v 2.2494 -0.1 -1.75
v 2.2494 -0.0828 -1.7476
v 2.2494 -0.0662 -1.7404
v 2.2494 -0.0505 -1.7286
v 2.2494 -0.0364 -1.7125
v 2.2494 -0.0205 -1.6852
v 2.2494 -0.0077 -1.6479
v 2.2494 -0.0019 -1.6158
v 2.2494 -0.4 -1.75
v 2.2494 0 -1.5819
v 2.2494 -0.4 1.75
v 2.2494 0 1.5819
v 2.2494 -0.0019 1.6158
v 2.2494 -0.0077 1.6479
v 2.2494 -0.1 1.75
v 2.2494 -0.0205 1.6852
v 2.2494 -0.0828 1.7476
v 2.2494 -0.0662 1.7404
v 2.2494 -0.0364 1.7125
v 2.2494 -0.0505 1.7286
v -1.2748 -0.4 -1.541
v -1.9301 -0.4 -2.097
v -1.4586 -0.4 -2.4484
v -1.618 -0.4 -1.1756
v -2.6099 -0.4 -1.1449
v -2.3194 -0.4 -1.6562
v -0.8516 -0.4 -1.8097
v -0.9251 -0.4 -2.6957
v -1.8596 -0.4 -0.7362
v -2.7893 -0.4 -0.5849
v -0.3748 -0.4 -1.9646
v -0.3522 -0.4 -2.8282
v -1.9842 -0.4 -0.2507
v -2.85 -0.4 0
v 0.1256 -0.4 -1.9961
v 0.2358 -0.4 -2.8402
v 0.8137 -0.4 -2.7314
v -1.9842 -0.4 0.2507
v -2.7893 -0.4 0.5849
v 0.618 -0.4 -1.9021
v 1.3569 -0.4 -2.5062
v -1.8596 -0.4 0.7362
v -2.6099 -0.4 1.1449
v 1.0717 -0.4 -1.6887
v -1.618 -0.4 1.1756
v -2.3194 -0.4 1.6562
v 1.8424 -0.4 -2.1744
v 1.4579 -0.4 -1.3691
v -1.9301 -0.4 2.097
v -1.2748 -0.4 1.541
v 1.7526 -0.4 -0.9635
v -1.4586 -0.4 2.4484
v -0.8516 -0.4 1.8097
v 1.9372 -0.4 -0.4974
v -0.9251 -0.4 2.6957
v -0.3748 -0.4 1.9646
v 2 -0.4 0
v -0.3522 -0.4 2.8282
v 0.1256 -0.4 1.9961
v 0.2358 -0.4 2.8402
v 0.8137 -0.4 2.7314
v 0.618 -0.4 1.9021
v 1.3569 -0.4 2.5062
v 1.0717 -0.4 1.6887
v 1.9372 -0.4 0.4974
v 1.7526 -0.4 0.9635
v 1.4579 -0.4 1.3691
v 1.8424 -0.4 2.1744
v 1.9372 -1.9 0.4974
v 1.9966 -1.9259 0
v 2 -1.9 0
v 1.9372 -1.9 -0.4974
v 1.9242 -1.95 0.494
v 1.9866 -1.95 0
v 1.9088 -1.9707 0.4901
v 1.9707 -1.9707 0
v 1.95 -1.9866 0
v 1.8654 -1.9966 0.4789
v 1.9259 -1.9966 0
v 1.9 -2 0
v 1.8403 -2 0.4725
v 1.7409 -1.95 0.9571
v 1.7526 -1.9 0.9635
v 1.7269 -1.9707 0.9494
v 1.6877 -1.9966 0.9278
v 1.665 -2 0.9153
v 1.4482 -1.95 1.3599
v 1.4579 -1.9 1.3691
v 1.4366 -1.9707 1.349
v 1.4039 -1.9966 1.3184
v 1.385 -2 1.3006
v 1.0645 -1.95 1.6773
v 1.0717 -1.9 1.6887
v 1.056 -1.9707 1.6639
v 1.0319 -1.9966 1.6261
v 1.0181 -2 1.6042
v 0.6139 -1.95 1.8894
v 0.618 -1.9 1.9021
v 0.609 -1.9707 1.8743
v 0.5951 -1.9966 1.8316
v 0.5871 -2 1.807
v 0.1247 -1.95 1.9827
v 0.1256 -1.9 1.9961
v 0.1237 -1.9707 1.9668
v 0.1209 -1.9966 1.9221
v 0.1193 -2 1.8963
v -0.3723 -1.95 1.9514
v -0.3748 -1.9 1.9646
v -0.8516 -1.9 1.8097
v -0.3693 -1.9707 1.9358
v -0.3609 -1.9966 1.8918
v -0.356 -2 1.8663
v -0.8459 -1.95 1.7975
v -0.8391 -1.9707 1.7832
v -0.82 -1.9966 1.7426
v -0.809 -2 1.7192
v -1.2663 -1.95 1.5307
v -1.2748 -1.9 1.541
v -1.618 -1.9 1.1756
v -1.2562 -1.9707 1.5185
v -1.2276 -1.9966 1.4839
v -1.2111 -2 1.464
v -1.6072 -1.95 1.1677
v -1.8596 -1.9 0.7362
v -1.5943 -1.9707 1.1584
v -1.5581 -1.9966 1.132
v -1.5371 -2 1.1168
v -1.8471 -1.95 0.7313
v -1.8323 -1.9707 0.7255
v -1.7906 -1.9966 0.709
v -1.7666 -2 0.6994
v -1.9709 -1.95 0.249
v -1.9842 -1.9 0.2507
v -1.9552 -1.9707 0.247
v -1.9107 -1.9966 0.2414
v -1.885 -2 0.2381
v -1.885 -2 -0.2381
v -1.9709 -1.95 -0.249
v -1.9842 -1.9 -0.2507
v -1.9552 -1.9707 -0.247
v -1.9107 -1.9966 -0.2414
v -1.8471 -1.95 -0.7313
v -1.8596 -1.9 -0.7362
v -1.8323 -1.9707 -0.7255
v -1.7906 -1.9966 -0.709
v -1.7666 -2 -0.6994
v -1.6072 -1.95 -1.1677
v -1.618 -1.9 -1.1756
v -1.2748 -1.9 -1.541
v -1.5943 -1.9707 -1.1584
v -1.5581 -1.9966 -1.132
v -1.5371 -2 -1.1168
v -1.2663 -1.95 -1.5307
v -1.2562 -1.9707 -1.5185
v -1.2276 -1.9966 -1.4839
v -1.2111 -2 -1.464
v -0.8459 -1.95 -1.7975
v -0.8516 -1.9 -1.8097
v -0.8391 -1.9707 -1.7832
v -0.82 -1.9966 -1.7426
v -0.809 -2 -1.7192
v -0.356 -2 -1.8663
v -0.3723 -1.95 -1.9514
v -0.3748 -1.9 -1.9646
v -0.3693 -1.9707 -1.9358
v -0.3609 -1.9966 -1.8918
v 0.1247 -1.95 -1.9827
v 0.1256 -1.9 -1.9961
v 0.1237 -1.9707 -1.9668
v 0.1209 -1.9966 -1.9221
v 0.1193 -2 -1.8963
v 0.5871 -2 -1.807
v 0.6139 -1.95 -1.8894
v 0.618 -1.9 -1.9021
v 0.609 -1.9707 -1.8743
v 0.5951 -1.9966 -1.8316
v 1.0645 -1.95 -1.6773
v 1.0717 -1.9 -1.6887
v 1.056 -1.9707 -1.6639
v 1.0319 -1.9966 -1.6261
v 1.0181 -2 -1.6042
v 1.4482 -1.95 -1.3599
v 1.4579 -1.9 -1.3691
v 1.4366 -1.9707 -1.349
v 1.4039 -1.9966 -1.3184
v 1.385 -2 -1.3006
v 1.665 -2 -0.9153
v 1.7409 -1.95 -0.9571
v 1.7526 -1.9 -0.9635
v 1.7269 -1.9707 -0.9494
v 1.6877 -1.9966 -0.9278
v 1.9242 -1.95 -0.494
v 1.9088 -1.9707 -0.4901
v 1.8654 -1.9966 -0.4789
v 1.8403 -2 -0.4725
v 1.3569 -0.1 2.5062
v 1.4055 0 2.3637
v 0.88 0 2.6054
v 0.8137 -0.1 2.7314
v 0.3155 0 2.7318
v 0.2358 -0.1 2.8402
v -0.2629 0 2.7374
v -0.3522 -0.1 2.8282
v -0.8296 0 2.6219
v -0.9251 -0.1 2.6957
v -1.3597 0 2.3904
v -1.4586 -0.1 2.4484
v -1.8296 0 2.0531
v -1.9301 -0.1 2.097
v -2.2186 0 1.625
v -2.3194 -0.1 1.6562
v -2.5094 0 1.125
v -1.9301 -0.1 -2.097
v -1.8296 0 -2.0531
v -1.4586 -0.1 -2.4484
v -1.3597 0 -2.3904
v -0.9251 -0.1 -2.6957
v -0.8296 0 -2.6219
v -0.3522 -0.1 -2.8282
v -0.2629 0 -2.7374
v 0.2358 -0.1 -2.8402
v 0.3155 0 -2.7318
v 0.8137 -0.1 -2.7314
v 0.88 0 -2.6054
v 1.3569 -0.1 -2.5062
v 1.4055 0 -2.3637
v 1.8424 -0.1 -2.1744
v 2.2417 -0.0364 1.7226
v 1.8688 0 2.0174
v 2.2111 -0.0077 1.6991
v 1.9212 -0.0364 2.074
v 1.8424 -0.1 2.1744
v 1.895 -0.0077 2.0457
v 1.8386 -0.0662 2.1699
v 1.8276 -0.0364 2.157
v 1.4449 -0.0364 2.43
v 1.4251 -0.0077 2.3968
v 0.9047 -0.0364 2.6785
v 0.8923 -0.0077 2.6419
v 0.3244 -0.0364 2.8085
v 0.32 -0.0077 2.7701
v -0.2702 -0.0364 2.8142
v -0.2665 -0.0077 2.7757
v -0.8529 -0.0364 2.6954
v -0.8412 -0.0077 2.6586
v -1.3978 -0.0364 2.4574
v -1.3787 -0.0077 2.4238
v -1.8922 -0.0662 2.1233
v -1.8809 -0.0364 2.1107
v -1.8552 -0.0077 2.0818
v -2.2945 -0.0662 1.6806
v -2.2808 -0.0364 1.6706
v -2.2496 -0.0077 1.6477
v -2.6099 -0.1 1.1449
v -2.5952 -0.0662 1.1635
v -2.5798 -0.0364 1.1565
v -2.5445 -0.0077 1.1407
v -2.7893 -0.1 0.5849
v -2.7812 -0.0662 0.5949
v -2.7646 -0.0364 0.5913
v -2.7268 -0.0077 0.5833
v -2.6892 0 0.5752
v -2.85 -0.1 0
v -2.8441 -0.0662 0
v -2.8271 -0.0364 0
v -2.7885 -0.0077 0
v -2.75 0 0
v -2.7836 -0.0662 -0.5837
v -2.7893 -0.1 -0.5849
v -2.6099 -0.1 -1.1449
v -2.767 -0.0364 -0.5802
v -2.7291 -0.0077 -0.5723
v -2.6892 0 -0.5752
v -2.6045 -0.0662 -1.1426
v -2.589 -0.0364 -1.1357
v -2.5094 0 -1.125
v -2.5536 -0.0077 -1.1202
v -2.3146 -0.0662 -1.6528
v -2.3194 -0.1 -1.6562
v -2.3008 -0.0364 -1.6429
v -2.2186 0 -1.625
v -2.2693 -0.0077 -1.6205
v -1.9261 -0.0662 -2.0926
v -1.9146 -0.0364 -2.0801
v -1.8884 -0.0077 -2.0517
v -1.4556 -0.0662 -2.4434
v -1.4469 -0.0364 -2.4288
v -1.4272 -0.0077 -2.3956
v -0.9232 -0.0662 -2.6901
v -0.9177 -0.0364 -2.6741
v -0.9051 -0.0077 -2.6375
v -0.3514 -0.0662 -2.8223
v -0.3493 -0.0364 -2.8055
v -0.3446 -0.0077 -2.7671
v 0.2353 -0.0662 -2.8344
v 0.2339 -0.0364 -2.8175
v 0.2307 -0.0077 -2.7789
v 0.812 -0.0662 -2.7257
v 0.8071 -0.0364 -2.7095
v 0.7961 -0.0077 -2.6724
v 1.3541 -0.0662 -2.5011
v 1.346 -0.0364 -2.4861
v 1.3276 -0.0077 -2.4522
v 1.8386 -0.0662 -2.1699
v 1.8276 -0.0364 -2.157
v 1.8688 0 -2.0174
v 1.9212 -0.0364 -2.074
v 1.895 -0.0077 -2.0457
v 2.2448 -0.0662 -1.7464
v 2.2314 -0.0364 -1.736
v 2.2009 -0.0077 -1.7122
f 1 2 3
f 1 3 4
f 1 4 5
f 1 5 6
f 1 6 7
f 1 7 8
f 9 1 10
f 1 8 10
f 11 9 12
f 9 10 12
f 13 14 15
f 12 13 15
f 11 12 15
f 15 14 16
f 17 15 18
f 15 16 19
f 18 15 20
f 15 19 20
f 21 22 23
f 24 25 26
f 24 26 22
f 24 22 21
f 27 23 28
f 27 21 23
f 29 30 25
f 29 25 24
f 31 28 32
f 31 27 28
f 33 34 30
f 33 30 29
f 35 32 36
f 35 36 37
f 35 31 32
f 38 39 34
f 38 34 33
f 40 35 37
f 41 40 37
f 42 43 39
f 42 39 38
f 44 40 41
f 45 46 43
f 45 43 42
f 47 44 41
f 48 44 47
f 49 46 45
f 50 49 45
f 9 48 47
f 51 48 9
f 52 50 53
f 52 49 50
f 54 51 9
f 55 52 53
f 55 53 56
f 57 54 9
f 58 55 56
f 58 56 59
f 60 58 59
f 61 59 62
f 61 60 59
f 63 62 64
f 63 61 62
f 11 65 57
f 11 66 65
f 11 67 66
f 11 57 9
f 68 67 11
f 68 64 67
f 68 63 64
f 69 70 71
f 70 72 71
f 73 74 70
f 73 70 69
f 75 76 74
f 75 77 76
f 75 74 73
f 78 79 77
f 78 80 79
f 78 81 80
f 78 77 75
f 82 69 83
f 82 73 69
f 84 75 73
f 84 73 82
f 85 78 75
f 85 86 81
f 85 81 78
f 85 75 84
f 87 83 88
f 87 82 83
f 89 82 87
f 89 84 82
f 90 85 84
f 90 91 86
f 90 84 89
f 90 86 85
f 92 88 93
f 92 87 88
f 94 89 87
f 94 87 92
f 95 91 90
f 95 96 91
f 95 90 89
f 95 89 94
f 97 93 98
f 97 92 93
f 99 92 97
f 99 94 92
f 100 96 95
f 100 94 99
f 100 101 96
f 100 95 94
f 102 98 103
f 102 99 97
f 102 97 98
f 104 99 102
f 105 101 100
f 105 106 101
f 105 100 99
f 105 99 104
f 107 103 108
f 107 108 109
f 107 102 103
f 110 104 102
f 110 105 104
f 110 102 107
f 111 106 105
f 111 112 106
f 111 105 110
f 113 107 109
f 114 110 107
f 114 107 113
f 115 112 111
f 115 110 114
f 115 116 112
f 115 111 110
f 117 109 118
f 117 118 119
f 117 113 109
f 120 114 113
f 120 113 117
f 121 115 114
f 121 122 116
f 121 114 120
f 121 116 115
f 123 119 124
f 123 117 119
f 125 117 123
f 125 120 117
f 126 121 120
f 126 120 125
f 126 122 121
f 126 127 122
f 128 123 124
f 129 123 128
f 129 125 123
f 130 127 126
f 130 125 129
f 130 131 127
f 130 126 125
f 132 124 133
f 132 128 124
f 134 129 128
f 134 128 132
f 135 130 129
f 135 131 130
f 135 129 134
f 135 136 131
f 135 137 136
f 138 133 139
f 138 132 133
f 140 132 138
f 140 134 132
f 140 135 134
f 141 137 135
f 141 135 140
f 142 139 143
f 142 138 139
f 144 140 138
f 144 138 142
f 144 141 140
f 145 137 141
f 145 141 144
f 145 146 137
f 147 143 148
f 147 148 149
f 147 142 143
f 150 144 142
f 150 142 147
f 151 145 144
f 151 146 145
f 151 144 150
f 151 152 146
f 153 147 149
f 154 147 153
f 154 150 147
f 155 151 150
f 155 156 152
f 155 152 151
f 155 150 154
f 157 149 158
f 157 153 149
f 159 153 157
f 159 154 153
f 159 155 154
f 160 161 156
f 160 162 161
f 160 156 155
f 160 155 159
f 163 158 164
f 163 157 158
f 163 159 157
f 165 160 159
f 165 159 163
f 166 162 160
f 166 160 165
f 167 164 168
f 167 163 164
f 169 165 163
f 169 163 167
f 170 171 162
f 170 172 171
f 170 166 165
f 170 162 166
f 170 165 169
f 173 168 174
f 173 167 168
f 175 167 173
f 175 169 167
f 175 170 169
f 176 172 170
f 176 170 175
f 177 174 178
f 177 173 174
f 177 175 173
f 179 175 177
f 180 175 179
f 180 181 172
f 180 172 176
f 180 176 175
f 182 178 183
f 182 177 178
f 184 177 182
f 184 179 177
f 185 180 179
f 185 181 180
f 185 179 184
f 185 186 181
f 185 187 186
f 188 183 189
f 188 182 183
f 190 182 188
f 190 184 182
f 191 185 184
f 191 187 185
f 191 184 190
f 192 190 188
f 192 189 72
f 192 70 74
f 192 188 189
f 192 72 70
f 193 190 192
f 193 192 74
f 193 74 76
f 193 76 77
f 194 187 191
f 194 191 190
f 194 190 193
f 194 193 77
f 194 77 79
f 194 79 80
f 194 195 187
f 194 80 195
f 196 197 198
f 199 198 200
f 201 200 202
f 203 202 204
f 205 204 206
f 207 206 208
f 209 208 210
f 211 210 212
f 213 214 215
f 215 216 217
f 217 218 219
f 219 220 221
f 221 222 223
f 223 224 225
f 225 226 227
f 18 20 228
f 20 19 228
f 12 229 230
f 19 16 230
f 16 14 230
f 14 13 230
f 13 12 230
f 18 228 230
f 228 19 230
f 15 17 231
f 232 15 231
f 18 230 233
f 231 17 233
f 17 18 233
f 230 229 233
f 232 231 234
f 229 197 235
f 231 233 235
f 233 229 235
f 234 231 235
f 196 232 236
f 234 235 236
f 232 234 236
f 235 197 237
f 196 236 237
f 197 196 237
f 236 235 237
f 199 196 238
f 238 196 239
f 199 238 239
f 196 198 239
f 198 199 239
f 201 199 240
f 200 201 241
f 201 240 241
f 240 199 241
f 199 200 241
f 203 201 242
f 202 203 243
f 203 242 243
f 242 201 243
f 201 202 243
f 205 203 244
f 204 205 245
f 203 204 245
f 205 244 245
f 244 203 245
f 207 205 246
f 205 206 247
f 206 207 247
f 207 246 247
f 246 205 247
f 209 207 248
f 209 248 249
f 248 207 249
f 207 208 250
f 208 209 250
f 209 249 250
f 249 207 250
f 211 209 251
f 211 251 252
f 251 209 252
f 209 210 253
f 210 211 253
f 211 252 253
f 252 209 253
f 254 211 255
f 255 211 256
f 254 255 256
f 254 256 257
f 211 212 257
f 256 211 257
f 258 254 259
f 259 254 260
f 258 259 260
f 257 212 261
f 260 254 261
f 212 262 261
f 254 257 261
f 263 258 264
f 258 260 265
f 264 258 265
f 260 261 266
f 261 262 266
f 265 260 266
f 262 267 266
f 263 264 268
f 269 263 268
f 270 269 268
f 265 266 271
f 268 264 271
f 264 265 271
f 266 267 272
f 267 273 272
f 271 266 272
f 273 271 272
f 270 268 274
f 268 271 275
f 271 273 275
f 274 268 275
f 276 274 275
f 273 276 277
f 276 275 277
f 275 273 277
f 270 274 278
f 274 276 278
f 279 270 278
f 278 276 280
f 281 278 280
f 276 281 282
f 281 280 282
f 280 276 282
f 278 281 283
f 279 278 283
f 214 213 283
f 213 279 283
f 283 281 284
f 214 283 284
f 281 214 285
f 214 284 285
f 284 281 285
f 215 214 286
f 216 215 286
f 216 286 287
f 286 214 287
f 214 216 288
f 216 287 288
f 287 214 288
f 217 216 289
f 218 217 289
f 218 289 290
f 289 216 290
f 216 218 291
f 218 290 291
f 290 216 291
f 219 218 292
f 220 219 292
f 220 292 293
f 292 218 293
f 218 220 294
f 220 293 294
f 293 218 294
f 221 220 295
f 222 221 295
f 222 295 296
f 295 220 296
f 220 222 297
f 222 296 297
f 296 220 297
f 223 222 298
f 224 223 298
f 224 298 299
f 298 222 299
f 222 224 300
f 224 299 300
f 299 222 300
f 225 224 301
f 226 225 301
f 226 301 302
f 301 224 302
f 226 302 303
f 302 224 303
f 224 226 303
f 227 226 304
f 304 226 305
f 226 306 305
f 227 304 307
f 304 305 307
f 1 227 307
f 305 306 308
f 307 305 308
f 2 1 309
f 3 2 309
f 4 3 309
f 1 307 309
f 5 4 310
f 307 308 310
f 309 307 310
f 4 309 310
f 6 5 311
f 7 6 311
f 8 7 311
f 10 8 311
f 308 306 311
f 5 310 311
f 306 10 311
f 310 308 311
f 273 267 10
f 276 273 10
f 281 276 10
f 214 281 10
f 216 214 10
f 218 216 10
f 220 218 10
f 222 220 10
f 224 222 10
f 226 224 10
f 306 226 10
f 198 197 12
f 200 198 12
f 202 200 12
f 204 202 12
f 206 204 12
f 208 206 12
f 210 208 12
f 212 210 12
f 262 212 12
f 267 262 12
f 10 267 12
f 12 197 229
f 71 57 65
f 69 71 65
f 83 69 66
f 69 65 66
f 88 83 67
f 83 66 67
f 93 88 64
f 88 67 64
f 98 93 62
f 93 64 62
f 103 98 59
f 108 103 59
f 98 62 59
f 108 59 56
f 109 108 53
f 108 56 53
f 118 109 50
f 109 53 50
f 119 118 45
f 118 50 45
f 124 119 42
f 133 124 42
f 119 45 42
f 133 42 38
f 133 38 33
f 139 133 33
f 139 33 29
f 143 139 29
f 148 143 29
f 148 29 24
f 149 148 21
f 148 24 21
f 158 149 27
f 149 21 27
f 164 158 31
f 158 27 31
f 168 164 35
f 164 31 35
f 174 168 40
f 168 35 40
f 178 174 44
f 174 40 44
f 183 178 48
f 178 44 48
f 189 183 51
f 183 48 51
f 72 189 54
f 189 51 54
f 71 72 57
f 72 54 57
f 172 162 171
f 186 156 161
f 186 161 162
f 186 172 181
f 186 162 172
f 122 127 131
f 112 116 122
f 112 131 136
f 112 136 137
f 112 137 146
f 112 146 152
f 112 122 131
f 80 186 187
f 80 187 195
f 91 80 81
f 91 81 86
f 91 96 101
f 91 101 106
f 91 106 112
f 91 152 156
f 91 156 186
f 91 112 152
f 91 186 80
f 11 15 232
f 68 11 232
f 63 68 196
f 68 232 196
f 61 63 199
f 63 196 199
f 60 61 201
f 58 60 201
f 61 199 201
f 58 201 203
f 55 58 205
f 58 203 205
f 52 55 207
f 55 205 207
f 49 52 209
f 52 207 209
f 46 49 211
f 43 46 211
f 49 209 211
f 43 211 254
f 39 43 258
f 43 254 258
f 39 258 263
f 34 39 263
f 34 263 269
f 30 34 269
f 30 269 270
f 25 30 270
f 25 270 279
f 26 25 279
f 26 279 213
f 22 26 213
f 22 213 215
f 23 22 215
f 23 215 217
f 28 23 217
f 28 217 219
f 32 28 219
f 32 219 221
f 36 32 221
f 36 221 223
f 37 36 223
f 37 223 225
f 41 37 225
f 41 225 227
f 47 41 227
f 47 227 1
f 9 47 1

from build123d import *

# Parameters (mm, degrees)
F0_R     = 2.85
F1_DEPTH = 0.4
F2_R     = 2
F3_DEPTH = 1.6
F4_R     = 0.1
F6_DEPTH = 25


with BuildPart() as f1:
    # F0 (on Front) → F1 (new body)
    with BuildSketch(Plane.XZ):
        Circle(F0_R)
    extrude(amount=F1_DEPTH)

    # F2 (on face) → F3 (join)
    with BuildSketch(Plane.XZ.offset(0.4)):
        Circle(F2_R)
    extrude(amount=F3_DEPTH)

    # F4
    f4_edges = [f1.edges().sort_by_distance(p)[0] for p in [
        (-2, -2, 0),
        (-2.85, 0, 0),
    ]]
    fillet(f4_edges, radius=F4_R)

    # F5 (on face) → F6 (cut)
    with BuildSketch(Plane(origin=(0, 0, 0), x_dir=(-1, 0, 0), z_dir=(0, 1, 0))):
        with BuildLine():
            Line((-2.249444, -1.75), (-2.249444, 1.75))
            ThreePointArc((-2.249444, 1.75), (-2.85, 0), (-2.249444, -1.75))
        make_face()
    extrude(amount=-F6_DEPTH, mode=Mode.SUBTRACT)


solid = f1.part
